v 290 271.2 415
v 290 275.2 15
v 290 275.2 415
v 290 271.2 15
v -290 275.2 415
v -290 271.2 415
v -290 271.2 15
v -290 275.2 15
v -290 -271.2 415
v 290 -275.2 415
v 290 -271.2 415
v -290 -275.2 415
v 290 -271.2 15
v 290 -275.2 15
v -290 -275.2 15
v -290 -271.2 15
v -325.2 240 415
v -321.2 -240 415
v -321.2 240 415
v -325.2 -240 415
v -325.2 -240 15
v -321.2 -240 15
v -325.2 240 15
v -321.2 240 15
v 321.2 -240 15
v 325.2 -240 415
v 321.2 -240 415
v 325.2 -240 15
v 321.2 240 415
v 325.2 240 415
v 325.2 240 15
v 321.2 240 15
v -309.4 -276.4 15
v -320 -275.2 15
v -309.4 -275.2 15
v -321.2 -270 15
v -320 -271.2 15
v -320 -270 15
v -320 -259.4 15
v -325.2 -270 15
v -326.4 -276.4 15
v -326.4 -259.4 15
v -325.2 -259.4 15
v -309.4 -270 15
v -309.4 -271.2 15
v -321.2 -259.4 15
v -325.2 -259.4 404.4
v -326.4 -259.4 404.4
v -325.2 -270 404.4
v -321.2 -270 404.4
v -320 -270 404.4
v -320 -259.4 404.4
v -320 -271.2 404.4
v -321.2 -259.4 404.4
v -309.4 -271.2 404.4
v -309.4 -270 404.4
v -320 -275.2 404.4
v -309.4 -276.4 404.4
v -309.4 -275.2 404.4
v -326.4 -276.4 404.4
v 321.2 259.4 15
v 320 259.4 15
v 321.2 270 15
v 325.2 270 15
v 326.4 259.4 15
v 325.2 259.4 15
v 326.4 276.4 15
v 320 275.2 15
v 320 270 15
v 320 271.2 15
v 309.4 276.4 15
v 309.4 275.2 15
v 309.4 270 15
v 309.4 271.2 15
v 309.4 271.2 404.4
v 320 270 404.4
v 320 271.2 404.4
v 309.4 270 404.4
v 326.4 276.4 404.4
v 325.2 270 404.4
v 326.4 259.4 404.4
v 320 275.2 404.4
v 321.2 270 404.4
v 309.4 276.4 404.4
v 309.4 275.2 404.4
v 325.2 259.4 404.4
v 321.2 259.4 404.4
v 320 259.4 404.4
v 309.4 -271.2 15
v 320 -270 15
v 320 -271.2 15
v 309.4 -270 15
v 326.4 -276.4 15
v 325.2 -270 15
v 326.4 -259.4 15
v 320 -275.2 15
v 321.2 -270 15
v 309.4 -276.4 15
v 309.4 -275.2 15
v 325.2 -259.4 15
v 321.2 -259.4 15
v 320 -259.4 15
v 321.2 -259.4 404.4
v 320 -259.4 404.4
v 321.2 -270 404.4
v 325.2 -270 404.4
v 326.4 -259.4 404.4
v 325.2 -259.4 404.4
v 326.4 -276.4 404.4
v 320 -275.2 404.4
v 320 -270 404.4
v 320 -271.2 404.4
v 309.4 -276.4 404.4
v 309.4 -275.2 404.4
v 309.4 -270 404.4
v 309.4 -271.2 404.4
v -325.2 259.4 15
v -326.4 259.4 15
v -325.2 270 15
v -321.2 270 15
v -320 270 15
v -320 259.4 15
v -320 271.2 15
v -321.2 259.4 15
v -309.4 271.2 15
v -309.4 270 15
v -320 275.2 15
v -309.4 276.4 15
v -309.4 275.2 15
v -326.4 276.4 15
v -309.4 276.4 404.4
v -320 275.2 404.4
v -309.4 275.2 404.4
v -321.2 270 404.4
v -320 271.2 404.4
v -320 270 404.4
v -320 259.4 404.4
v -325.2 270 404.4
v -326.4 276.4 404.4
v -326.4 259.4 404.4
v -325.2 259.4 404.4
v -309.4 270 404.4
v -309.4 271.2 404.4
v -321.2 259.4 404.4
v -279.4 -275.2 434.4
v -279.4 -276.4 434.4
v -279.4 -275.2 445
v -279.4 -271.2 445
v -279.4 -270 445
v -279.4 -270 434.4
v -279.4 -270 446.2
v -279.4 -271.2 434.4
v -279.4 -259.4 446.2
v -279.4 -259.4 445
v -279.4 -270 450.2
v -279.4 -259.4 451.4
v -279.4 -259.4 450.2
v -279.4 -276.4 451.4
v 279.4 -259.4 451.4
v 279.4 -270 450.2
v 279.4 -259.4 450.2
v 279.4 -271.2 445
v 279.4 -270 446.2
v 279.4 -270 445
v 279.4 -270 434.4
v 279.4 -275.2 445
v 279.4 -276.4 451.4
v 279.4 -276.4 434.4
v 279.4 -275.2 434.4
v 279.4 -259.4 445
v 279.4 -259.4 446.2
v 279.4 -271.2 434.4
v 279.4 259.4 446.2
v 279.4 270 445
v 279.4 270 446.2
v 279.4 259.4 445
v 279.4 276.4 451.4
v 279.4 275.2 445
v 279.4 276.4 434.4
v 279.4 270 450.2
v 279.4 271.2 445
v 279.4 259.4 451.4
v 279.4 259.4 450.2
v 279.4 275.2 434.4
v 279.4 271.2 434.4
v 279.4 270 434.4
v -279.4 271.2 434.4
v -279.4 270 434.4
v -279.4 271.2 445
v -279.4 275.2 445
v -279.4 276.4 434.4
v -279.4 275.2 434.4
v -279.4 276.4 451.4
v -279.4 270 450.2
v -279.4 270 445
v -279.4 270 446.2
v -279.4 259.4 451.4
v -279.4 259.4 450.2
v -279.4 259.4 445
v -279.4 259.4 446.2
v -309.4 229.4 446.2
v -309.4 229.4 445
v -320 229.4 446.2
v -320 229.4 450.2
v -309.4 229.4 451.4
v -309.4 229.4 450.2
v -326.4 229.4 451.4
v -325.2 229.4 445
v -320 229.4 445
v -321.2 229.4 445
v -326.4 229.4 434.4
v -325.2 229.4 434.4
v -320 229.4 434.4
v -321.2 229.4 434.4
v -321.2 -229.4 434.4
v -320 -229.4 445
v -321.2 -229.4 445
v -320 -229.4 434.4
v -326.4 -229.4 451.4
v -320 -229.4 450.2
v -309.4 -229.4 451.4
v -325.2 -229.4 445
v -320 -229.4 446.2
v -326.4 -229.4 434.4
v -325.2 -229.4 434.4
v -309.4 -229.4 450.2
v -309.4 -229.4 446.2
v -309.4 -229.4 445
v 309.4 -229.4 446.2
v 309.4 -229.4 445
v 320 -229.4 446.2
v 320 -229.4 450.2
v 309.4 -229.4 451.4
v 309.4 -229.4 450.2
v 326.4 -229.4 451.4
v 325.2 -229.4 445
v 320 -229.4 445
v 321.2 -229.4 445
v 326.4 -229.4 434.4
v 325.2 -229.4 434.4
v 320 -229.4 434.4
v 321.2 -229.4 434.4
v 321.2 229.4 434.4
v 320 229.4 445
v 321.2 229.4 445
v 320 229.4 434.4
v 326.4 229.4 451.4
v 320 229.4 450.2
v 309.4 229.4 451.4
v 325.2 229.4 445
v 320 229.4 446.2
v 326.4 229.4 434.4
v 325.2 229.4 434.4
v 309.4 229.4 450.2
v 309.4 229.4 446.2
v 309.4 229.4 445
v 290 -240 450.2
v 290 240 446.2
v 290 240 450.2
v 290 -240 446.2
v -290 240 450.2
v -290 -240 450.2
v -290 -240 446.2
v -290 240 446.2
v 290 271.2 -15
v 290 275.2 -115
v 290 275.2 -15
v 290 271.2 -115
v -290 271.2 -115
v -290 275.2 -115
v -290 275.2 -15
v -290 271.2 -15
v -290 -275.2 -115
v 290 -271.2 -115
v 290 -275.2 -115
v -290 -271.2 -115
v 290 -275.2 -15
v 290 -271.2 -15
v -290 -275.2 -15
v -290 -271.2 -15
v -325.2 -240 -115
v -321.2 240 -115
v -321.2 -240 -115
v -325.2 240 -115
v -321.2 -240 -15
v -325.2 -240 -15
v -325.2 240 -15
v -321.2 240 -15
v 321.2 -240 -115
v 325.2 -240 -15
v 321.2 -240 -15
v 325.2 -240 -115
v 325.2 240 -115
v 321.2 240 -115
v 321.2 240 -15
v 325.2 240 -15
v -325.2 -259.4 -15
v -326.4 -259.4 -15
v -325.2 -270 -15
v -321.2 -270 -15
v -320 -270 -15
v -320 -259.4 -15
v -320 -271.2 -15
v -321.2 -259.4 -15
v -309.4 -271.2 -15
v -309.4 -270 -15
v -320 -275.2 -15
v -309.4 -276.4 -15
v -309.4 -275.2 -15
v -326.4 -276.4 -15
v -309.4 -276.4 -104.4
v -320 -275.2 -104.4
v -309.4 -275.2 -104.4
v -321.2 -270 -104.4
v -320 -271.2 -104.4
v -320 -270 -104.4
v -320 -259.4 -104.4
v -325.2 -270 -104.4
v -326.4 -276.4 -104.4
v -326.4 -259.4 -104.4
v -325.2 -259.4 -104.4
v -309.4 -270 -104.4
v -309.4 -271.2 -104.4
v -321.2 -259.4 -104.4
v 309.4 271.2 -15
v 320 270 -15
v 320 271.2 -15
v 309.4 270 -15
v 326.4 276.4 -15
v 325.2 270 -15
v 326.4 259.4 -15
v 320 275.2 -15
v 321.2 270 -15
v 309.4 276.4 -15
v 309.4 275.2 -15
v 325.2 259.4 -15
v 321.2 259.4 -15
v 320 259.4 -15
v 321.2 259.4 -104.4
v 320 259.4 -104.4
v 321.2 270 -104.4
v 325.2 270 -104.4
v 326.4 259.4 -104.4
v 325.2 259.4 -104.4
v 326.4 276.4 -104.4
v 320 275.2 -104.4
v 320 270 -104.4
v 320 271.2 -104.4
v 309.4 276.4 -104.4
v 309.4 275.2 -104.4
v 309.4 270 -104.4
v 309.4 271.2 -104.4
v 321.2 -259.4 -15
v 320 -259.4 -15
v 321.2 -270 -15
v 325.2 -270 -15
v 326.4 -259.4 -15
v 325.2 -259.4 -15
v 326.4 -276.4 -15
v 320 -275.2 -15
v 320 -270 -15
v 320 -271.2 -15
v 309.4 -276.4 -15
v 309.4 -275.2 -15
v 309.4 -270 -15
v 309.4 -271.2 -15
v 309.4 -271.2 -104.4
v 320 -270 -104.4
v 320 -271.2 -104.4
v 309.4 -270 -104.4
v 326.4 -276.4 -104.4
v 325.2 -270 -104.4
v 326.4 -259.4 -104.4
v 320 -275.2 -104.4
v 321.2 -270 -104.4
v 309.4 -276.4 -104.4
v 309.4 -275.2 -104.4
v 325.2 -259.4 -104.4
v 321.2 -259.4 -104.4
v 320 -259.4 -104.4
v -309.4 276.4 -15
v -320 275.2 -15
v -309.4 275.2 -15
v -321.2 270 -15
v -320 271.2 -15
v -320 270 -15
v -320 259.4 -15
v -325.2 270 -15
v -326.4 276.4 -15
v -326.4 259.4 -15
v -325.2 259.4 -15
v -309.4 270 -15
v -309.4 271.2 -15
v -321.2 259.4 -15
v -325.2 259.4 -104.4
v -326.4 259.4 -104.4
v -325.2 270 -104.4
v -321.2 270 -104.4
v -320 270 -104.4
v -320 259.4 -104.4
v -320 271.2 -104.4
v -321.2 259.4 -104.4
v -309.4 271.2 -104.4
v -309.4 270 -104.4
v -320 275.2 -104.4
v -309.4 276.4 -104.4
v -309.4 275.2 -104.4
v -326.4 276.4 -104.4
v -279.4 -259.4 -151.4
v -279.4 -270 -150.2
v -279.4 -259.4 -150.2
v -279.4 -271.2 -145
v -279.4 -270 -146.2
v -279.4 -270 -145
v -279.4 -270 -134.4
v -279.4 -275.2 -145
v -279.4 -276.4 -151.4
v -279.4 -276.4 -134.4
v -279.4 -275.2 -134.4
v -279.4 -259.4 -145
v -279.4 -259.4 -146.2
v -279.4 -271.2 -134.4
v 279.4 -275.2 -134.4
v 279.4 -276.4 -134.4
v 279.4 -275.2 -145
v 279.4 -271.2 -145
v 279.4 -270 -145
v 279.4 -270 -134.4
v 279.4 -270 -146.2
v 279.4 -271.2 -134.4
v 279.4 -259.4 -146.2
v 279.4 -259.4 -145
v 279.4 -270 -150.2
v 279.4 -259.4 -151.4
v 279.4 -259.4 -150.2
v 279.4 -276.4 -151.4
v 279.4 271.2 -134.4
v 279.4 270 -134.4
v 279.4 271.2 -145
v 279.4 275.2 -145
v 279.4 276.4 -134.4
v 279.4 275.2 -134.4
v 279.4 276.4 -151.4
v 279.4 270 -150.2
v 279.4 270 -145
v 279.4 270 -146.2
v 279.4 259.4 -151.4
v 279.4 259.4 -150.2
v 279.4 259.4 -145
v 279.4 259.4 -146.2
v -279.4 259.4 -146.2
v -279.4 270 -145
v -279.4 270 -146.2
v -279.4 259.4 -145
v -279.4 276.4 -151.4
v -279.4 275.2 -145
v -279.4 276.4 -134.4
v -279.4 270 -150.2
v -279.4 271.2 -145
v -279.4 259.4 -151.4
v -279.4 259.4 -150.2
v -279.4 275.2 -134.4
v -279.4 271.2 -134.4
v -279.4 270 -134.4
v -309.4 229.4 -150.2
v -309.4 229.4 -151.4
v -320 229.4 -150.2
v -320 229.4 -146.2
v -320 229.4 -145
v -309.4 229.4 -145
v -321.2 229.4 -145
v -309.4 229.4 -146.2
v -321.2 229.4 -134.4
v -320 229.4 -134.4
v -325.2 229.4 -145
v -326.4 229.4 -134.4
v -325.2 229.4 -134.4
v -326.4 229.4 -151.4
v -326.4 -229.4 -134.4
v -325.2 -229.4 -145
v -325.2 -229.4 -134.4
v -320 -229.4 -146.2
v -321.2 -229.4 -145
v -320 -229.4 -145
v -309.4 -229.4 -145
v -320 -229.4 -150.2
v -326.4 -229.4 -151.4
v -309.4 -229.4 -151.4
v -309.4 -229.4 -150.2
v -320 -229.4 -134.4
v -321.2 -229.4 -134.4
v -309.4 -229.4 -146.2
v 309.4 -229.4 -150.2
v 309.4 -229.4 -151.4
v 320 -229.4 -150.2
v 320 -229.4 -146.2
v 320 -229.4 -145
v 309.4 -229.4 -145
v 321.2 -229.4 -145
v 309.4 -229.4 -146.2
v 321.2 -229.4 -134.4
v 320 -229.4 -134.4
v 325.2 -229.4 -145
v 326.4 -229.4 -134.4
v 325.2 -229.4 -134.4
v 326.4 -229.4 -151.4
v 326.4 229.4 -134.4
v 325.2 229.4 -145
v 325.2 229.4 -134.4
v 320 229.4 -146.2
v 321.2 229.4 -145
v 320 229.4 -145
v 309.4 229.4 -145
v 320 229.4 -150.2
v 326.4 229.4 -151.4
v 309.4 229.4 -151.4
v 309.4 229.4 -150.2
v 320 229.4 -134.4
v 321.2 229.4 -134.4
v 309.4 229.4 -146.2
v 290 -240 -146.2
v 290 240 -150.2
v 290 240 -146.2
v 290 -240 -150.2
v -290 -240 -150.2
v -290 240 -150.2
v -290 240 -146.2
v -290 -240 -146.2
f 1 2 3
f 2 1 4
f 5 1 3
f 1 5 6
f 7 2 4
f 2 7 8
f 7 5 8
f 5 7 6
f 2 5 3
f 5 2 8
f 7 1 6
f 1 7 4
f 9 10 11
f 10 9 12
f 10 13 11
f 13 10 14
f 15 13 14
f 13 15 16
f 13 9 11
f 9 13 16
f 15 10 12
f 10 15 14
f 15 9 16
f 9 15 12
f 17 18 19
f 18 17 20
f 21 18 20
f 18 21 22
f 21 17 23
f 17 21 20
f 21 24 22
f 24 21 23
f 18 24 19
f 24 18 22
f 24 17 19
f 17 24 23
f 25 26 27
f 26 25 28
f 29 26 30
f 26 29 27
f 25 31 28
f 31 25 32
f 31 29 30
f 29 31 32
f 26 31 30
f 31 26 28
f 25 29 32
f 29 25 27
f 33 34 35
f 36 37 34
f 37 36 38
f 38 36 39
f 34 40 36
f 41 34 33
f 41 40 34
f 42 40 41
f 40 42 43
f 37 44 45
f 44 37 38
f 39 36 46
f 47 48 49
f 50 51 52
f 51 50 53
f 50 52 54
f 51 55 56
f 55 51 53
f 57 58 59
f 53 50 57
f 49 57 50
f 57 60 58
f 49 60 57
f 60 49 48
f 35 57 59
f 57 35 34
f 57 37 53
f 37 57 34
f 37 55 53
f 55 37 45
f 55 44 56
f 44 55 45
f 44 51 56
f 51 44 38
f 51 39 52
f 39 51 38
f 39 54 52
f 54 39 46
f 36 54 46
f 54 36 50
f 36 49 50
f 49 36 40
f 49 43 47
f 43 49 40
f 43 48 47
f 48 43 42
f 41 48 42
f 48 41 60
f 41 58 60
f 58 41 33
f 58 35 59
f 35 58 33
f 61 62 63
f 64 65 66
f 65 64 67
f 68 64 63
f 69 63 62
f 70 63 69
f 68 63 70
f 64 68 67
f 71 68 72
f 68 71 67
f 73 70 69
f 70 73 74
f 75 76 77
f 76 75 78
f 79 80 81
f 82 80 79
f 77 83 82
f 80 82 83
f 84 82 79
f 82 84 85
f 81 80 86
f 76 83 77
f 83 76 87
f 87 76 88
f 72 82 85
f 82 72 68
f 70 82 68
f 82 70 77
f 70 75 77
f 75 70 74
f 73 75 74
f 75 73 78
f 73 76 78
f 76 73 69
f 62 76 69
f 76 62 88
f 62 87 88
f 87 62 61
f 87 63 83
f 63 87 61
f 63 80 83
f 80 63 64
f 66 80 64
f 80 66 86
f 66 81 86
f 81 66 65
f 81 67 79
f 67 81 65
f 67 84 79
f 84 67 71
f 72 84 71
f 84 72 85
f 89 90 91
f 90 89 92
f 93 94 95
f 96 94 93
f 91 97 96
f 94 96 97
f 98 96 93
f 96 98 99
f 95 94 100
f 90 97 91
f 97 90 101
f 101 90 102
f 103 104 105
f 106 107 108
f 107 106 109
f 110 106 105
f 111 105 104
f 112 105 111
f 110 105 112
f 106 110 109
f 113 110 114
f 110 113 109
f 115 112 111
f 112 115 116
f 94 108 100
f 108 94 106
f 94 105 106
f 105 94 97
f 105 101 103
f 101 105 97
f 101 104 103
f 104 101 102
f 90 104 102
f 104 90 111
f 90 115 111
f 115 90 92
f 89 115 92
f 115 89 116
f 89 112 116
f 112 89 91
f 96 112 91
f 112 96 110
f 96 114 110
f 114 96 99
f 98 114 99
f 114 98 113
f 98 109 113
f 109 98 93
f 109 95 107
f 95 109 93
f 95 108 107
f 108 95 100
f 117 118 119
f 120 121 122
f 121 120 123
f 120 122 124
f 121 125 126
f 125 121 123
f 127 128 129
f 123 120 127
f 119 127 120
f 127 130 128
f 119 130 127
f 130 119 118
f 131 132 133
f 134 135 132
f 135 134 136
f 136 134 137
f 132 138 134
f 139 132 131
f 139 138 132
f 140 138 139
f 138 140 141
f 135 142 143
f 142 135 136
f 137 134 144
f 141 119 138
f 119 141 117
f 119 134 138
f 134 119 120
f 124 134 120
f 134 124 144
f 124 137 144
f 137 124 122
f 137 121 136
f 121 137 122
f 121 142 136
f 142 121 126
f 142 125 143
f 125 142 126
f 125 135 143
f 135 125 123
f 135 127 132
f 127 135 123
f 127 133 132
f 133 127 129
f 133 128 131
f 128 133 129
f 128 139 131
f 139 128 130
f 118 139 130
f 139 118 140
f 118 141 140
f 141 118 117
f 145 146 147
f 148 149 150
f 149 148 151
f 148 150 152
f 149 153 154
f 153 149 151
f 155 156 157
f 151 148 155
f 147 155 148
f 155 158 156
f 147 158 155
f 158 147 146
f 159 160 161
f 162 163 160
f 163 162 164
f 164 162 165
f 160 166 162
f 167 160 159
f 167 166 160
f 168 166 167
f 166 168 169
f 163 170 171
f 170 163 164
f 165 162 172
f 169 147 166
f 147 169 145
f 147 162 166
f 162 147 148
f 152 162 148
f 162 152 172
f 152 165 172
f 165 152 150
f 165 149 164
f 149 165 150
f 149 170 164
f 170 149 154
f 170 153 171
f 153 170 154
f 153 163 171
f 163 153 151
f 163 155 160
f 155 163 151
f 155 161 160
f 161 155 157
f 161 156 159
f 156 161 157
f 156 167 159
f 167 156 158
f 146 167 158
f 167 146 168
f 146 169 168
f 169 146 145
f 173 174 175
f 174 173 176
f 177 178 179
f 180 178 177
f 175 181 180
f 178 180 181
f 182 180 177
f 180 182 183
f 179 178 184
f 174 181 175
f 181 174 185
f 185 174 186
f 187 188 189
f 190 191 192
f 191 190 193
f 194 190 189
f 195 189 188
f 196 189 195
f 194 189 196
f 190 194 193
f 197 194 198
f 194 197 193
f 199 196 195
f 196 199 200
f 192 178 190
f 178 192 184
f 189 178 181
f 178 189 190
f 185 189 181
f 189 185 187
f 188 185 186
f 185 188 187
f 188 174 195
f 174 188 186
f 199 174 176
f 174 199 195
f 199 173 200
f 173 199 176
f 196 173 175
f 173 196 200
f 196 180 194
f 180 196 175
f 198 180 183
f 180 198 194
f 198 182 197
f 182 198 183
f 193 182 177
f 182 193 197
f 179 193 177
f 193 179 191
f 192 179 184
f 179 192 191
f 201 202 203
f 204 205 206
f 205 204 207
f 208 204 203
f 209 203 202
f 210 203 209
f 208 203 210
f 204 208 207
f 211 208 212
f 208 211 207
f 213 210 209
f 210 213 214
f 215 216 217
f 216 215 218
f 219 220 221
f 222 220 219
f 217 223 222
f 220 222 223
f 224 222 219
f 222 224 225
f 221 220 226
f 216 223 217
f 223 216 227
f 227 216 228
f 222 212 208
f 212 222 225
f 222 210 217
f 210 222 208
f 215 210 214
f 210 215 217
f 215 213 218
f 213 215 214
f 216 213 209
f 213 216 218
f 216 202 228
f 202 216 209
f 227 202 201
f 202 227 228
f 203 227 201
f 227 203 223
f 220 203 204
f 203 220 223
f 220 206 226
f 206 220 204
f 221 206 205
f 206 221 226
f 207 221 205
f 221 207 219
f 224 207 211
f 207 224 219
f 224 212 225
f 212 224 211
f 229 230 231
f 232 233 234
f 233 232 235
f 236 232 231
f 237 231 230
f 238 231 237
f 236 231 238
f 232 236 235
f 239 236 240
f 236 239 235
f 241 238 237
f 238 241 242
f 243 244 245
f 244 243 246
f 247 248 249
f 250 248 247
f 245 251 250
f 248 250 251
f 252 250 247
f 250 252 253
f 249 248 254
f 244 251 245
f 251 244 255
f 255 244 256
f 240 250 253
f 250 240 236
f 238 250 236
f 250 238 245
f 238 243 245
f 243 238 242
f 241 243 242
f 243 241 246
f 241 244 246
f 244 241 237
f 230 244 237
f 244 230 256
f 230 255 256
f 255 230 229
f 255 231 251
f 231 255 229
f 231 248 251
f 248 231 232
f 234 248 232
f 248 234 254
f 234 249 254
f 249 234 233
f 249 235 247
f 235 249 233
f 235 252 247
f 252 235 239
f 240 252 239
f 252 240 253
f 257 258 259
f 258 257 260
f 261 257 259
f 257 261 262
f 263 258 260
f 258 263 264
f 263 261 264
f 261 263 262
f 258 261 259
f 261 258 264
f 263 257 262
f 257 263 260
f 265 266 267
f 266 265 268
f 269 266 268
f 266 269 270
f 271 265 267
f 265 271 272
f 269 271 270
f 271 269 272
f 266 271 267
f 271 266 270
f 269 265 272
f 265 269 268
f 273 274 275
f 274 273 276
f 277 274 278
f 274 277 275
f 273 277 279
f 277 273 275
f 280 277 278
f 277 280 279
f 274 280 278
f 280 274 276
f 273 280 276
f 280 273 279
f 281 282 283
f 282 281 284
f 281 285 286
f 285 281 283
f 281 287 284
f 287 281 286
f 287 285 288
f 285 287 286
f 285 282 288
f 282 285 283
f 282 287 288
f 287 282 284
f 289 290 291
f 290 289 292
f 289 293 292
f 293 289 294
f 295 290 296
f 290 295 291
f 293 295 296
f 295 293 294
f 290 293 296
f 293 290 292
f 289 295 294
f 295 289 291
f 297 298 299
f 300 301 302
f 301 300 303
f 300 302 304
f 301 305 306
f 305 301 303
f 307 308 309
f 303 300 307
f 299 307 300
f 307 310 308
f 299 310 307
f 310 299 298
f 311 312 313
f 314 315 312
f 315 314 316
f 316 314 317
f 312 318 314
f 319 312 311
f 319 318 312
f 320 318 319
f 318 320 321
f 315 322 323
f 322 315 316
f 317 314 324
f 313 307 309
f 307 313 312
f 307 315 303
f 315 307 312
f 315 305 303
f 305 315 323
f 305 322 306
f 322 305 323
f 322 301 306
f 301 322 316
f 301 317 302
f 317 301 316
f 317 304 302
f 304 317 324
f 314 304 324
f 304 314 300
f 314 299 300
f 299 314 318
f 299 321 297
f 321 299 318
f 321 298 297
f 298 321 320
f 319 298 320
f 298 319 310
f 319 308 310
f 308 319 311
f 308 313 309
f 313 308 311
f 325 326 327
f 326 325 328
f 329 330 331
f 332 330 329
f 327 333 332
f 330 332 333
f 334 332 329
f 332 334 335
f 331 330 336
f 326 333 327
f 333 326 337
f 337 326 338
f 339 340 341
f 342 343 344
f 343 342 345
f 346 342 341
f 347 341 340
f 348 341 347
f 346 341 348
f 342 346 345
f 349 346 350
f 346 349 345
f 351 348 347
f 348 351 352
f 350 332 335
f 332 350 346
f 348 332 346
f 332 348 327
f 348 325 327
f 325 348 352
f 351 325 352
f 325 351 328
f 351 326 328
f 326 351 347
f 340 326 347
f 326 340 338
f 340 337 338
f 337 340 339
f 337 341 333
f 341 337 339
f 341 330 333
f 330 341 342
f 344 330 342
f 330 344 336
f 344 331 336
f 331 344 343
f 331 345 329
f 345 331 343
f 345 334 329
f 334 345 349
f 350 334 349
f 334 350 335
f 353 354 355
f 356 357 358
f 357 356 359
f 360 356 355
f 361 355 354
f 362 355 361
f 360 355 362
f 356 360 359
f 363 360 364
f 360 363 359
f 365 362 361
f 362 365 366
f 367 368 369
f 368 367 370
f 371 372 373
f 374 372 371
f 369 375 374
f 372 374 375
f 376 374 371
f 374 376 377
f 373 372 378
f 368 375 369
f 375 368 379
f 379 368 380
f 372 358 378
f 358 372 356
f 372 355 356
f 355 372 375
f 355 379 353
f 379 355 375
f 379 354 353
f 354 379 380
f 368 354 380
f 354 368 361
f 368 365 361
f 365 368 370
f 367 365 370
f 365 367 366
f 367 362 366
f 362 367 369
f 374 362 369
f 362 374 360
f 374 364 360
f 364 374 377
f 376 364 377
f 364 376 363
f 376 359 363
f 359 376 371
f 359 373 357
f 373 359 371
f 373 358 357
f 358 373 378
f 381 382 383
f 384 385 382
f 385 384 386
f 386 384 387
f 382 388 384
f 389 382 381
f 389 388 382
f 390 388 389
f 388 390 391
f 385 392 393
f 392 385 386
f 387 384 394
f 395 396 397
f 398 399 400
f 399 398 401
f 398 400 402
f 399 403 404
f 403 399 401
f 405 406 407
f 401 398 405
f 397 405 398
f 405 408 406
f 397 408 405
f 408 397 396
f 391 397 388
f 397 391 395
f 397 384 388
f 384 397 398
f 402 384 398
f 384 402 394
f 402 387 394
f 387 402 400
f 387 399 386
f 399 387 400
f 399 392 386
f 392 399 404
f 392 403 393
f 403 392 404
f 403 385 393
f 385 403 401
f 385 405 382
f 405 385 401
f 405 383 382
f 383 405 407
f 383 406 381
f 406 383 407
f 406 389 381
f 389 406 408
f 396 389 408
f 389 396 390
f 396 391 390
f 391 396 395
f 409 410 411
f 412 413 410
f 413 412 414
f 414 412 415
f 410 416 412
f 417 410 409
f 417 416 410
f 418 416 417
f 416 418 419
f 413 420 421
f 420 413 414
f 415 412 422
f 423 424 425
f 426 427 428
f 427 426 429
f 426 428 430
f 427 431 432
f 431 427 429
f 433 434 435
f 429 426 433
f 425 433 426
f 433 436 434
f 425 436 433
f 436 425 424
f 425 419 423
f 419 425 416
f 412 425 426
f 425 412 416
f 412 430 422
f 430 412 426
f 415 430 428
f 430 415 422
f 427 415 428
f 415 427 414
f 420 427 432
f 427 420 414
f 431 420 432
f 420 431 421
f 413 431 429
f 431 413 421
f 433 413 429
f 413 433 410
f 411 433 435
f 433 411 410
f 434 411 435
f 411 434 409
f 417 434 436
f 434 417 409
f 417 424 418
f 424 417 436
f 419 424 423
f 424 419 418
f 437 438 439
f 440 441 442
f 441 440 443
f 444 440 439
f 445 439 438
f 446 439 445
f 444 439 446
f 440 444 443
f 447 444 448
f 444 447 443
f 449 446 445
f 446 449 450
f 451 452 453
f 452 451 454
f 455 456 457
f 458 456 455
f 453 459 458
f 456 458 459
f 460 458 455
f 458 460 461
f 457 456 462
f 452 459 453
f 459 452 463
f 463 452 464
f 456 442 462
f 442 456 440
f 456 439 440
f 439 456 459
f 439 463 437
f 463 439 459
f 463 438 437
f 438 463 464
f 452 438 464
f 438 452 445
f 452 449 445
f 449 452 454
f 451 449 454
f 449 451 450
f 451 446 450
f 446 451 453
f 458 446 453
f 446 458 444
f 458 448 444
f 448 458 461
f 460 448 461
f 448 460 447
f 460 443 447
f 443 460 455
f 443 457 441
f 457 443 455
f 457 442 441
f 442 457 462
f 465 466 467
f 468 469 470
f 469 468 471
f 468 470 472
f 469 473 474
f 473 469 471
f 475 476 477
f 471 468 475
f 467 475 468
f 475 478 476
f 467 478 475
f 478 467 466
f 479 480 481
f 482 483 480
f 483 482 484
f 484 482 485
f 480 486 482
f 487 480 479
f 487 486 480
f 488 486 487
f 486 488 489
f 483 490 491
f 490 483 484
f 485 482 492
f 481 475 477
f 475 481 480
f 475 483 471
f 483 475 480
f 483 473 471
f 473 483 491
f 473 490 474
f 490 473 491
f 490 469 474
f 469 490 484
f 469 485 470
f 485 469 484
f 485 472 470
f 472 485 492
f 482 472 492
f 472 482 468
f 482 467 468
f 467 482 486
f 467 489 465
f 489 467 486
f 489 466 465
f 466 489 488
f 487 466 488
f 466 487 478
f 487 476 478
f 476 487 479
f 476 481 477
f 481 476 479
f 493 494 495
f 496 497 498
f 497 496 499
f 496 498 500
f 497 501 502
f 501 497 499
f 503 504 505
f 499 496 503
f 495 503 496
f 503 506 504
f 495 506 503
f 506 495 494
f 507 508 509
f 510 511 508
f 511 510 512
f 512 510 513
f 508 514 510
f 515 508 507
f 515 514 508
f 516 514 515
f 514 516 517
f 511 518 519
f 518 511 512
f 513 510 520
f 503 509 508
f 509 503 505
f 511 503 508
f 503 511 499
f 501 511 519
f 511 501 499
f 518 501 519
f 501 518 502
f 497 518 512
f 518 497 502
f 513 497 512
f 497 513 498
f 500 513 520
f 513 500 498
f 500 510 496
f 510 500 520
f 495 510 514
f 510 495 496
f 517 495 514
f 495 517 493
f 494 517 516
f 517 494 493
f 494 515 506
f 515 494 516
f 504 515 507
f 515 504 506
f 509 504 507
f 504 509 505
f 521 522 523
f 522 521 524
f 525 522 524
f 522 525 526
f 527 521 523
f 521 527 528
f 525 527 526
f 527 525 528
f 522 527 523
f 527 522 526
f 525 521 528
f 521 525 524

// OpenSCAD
//**** Deklaration
//Innenmasse in mm
base_height = 100;  // Höhe in mm
lid_height = 400;   // Höhe in mm
length = 480;       //länge innenmaß in mm
width = 580;        //breite innenmaß in mm
explode = 30;       //ersatz fürExplosionsansicht
profil_nummer = 0;  // Default-Wert, falls keine Nummer übergeben wird
//****Profildeklaration

//Profiltypen ohne Gewähr
profils = [
    ["Adam Hall 6136",17,10.6,1.2,4],
    ["Adam Hall 6137",18,11.1,1.2,4.5],
    ["Adam Hall 6129",22,12,1.5,7],
    ["Adam Hall 6106",30,20,1.5,7],
    ["Adam Hall 6107",30,17,1.5,9.5],
    ["Adam Hall 6119",30,16,1.5,10]
];
profil = profils[profil_nummer];
//****Deklaration ENDE



//kalkulationen und umwandlungen um den Code besser lesbar zu halten
schenkellength = profil[1];         // Schenkellänge in mm
reduction = profil[2];              //Einschubtiefe
materialthickness = profil[3];      // Materialstärke in mm
thickness = profil[4];              // Dicke in mm (4mm)
profiloffset = schenkellength - reduction; //offset für Profile
walloffset = profiloffset - materialthickness - thickness; //offset für Platten


//Aluprofil erstellen
module casemaker(height){
    strecke = [0,materialthickness,materialthickness+thickness,materialthickness*2+thickness,schenkellength];
    color("blue", 0.4) linear_extrude(height, convexity=10) polygon([
        [strecke[0], strecke[0]],
        [strecke[4], strecke[0]],
        [strecke[4], strecke[1]],
        [profiloffset, strecke[1]],//strecke[3]
        [profiloffset, strecke[2]],//strecke[3]
        [strecke[4], strecke[2]],
        [strecke[4], strecke[3]],
        [strecke[3], strecke[3]],
        [strecke[3], strecke[4]],
        [strecke[2], strecke[4]],
        [strecke[2], profiloffset],//strecke[3]
        [strecke[1], profiloffset],//strecke[3]
        [strecke[1], strecke[4]],
        [strecke[0], strecke[4]]
    ]);   
    echo(str("Aluprofil vom Typ: ",profil[0]," in der Länge ",height,"mm"));
}


module walls( height, explode)
    {
    for(i=[0,180]) rotate([0,0,i]) translate([0,length/2 + thickness/2 + explode, height/2]) cube([width,thickness,height], center = true);
    echo(str("2x Front: LxHxT ",width,"x",height,"x",thickness,"mm"));
    for(i=[90,270]) rotate([0,0,i]) translate([0,width/2 + thickness/2 + explode, height/2]) cube([length,thickness,height], center = true);
    echo(str("2x Seite: LxHxT ",length,"x",height,"x",thickness,"mm"));
    }
module lid(height, explode)
    {
    translate([0,0,height + thickness/2 + explode]) cube([width,length,thickness], center = true);
    echo(str("1x Deckplatte: LxHxT ",width,"x",length,"x",thickness,"mm"));
    }
module wall_profile(height, explode){
    for(i = [0,180]) rotate([0,0,i]) translate([-width/2 - explode,-length/2 - explode,0])casemaker(height-reduction);
    for(i = [90,270]) rotate([0,0,i]) translate([-length/2 - explode,-width/2 - explode,0])casemaker(height-reduction);
    }
module lid_profile(height, explode){
    for (i = [0,180])rotate([i,90,0]) translate([-(height + explode), - (length/2 + explode), -width/2 + reduction]) casemaker(width-reduction*2);
    for (i = [90,270])rotate([i,90,0]) translate([-(height + explode), - (width/2 + explode), -length/2 + reduction]) casemaker(length-reduction*2);
    }
    
module create_half_flightcase(height){    
    walls       (height, explode + walloffset);
    lid         (height, explode + walloffset);
    wall_profile(height, explode + profiloffset);
    lid_profile (height, explode + profiloffset);
}
echo(str("Beginne Shoppingliste Teil 1"));
translate([0,0,explode/2]) create_half_flightcase(lid_height);
echo(str("Beginne Shoppingliste Teil 2"));
mirror([0,0,1]) translate([0,0,explode/2]) create_half_flightcase(base_height);
echo(str("Alle Angaben ohne Gewähr"));
